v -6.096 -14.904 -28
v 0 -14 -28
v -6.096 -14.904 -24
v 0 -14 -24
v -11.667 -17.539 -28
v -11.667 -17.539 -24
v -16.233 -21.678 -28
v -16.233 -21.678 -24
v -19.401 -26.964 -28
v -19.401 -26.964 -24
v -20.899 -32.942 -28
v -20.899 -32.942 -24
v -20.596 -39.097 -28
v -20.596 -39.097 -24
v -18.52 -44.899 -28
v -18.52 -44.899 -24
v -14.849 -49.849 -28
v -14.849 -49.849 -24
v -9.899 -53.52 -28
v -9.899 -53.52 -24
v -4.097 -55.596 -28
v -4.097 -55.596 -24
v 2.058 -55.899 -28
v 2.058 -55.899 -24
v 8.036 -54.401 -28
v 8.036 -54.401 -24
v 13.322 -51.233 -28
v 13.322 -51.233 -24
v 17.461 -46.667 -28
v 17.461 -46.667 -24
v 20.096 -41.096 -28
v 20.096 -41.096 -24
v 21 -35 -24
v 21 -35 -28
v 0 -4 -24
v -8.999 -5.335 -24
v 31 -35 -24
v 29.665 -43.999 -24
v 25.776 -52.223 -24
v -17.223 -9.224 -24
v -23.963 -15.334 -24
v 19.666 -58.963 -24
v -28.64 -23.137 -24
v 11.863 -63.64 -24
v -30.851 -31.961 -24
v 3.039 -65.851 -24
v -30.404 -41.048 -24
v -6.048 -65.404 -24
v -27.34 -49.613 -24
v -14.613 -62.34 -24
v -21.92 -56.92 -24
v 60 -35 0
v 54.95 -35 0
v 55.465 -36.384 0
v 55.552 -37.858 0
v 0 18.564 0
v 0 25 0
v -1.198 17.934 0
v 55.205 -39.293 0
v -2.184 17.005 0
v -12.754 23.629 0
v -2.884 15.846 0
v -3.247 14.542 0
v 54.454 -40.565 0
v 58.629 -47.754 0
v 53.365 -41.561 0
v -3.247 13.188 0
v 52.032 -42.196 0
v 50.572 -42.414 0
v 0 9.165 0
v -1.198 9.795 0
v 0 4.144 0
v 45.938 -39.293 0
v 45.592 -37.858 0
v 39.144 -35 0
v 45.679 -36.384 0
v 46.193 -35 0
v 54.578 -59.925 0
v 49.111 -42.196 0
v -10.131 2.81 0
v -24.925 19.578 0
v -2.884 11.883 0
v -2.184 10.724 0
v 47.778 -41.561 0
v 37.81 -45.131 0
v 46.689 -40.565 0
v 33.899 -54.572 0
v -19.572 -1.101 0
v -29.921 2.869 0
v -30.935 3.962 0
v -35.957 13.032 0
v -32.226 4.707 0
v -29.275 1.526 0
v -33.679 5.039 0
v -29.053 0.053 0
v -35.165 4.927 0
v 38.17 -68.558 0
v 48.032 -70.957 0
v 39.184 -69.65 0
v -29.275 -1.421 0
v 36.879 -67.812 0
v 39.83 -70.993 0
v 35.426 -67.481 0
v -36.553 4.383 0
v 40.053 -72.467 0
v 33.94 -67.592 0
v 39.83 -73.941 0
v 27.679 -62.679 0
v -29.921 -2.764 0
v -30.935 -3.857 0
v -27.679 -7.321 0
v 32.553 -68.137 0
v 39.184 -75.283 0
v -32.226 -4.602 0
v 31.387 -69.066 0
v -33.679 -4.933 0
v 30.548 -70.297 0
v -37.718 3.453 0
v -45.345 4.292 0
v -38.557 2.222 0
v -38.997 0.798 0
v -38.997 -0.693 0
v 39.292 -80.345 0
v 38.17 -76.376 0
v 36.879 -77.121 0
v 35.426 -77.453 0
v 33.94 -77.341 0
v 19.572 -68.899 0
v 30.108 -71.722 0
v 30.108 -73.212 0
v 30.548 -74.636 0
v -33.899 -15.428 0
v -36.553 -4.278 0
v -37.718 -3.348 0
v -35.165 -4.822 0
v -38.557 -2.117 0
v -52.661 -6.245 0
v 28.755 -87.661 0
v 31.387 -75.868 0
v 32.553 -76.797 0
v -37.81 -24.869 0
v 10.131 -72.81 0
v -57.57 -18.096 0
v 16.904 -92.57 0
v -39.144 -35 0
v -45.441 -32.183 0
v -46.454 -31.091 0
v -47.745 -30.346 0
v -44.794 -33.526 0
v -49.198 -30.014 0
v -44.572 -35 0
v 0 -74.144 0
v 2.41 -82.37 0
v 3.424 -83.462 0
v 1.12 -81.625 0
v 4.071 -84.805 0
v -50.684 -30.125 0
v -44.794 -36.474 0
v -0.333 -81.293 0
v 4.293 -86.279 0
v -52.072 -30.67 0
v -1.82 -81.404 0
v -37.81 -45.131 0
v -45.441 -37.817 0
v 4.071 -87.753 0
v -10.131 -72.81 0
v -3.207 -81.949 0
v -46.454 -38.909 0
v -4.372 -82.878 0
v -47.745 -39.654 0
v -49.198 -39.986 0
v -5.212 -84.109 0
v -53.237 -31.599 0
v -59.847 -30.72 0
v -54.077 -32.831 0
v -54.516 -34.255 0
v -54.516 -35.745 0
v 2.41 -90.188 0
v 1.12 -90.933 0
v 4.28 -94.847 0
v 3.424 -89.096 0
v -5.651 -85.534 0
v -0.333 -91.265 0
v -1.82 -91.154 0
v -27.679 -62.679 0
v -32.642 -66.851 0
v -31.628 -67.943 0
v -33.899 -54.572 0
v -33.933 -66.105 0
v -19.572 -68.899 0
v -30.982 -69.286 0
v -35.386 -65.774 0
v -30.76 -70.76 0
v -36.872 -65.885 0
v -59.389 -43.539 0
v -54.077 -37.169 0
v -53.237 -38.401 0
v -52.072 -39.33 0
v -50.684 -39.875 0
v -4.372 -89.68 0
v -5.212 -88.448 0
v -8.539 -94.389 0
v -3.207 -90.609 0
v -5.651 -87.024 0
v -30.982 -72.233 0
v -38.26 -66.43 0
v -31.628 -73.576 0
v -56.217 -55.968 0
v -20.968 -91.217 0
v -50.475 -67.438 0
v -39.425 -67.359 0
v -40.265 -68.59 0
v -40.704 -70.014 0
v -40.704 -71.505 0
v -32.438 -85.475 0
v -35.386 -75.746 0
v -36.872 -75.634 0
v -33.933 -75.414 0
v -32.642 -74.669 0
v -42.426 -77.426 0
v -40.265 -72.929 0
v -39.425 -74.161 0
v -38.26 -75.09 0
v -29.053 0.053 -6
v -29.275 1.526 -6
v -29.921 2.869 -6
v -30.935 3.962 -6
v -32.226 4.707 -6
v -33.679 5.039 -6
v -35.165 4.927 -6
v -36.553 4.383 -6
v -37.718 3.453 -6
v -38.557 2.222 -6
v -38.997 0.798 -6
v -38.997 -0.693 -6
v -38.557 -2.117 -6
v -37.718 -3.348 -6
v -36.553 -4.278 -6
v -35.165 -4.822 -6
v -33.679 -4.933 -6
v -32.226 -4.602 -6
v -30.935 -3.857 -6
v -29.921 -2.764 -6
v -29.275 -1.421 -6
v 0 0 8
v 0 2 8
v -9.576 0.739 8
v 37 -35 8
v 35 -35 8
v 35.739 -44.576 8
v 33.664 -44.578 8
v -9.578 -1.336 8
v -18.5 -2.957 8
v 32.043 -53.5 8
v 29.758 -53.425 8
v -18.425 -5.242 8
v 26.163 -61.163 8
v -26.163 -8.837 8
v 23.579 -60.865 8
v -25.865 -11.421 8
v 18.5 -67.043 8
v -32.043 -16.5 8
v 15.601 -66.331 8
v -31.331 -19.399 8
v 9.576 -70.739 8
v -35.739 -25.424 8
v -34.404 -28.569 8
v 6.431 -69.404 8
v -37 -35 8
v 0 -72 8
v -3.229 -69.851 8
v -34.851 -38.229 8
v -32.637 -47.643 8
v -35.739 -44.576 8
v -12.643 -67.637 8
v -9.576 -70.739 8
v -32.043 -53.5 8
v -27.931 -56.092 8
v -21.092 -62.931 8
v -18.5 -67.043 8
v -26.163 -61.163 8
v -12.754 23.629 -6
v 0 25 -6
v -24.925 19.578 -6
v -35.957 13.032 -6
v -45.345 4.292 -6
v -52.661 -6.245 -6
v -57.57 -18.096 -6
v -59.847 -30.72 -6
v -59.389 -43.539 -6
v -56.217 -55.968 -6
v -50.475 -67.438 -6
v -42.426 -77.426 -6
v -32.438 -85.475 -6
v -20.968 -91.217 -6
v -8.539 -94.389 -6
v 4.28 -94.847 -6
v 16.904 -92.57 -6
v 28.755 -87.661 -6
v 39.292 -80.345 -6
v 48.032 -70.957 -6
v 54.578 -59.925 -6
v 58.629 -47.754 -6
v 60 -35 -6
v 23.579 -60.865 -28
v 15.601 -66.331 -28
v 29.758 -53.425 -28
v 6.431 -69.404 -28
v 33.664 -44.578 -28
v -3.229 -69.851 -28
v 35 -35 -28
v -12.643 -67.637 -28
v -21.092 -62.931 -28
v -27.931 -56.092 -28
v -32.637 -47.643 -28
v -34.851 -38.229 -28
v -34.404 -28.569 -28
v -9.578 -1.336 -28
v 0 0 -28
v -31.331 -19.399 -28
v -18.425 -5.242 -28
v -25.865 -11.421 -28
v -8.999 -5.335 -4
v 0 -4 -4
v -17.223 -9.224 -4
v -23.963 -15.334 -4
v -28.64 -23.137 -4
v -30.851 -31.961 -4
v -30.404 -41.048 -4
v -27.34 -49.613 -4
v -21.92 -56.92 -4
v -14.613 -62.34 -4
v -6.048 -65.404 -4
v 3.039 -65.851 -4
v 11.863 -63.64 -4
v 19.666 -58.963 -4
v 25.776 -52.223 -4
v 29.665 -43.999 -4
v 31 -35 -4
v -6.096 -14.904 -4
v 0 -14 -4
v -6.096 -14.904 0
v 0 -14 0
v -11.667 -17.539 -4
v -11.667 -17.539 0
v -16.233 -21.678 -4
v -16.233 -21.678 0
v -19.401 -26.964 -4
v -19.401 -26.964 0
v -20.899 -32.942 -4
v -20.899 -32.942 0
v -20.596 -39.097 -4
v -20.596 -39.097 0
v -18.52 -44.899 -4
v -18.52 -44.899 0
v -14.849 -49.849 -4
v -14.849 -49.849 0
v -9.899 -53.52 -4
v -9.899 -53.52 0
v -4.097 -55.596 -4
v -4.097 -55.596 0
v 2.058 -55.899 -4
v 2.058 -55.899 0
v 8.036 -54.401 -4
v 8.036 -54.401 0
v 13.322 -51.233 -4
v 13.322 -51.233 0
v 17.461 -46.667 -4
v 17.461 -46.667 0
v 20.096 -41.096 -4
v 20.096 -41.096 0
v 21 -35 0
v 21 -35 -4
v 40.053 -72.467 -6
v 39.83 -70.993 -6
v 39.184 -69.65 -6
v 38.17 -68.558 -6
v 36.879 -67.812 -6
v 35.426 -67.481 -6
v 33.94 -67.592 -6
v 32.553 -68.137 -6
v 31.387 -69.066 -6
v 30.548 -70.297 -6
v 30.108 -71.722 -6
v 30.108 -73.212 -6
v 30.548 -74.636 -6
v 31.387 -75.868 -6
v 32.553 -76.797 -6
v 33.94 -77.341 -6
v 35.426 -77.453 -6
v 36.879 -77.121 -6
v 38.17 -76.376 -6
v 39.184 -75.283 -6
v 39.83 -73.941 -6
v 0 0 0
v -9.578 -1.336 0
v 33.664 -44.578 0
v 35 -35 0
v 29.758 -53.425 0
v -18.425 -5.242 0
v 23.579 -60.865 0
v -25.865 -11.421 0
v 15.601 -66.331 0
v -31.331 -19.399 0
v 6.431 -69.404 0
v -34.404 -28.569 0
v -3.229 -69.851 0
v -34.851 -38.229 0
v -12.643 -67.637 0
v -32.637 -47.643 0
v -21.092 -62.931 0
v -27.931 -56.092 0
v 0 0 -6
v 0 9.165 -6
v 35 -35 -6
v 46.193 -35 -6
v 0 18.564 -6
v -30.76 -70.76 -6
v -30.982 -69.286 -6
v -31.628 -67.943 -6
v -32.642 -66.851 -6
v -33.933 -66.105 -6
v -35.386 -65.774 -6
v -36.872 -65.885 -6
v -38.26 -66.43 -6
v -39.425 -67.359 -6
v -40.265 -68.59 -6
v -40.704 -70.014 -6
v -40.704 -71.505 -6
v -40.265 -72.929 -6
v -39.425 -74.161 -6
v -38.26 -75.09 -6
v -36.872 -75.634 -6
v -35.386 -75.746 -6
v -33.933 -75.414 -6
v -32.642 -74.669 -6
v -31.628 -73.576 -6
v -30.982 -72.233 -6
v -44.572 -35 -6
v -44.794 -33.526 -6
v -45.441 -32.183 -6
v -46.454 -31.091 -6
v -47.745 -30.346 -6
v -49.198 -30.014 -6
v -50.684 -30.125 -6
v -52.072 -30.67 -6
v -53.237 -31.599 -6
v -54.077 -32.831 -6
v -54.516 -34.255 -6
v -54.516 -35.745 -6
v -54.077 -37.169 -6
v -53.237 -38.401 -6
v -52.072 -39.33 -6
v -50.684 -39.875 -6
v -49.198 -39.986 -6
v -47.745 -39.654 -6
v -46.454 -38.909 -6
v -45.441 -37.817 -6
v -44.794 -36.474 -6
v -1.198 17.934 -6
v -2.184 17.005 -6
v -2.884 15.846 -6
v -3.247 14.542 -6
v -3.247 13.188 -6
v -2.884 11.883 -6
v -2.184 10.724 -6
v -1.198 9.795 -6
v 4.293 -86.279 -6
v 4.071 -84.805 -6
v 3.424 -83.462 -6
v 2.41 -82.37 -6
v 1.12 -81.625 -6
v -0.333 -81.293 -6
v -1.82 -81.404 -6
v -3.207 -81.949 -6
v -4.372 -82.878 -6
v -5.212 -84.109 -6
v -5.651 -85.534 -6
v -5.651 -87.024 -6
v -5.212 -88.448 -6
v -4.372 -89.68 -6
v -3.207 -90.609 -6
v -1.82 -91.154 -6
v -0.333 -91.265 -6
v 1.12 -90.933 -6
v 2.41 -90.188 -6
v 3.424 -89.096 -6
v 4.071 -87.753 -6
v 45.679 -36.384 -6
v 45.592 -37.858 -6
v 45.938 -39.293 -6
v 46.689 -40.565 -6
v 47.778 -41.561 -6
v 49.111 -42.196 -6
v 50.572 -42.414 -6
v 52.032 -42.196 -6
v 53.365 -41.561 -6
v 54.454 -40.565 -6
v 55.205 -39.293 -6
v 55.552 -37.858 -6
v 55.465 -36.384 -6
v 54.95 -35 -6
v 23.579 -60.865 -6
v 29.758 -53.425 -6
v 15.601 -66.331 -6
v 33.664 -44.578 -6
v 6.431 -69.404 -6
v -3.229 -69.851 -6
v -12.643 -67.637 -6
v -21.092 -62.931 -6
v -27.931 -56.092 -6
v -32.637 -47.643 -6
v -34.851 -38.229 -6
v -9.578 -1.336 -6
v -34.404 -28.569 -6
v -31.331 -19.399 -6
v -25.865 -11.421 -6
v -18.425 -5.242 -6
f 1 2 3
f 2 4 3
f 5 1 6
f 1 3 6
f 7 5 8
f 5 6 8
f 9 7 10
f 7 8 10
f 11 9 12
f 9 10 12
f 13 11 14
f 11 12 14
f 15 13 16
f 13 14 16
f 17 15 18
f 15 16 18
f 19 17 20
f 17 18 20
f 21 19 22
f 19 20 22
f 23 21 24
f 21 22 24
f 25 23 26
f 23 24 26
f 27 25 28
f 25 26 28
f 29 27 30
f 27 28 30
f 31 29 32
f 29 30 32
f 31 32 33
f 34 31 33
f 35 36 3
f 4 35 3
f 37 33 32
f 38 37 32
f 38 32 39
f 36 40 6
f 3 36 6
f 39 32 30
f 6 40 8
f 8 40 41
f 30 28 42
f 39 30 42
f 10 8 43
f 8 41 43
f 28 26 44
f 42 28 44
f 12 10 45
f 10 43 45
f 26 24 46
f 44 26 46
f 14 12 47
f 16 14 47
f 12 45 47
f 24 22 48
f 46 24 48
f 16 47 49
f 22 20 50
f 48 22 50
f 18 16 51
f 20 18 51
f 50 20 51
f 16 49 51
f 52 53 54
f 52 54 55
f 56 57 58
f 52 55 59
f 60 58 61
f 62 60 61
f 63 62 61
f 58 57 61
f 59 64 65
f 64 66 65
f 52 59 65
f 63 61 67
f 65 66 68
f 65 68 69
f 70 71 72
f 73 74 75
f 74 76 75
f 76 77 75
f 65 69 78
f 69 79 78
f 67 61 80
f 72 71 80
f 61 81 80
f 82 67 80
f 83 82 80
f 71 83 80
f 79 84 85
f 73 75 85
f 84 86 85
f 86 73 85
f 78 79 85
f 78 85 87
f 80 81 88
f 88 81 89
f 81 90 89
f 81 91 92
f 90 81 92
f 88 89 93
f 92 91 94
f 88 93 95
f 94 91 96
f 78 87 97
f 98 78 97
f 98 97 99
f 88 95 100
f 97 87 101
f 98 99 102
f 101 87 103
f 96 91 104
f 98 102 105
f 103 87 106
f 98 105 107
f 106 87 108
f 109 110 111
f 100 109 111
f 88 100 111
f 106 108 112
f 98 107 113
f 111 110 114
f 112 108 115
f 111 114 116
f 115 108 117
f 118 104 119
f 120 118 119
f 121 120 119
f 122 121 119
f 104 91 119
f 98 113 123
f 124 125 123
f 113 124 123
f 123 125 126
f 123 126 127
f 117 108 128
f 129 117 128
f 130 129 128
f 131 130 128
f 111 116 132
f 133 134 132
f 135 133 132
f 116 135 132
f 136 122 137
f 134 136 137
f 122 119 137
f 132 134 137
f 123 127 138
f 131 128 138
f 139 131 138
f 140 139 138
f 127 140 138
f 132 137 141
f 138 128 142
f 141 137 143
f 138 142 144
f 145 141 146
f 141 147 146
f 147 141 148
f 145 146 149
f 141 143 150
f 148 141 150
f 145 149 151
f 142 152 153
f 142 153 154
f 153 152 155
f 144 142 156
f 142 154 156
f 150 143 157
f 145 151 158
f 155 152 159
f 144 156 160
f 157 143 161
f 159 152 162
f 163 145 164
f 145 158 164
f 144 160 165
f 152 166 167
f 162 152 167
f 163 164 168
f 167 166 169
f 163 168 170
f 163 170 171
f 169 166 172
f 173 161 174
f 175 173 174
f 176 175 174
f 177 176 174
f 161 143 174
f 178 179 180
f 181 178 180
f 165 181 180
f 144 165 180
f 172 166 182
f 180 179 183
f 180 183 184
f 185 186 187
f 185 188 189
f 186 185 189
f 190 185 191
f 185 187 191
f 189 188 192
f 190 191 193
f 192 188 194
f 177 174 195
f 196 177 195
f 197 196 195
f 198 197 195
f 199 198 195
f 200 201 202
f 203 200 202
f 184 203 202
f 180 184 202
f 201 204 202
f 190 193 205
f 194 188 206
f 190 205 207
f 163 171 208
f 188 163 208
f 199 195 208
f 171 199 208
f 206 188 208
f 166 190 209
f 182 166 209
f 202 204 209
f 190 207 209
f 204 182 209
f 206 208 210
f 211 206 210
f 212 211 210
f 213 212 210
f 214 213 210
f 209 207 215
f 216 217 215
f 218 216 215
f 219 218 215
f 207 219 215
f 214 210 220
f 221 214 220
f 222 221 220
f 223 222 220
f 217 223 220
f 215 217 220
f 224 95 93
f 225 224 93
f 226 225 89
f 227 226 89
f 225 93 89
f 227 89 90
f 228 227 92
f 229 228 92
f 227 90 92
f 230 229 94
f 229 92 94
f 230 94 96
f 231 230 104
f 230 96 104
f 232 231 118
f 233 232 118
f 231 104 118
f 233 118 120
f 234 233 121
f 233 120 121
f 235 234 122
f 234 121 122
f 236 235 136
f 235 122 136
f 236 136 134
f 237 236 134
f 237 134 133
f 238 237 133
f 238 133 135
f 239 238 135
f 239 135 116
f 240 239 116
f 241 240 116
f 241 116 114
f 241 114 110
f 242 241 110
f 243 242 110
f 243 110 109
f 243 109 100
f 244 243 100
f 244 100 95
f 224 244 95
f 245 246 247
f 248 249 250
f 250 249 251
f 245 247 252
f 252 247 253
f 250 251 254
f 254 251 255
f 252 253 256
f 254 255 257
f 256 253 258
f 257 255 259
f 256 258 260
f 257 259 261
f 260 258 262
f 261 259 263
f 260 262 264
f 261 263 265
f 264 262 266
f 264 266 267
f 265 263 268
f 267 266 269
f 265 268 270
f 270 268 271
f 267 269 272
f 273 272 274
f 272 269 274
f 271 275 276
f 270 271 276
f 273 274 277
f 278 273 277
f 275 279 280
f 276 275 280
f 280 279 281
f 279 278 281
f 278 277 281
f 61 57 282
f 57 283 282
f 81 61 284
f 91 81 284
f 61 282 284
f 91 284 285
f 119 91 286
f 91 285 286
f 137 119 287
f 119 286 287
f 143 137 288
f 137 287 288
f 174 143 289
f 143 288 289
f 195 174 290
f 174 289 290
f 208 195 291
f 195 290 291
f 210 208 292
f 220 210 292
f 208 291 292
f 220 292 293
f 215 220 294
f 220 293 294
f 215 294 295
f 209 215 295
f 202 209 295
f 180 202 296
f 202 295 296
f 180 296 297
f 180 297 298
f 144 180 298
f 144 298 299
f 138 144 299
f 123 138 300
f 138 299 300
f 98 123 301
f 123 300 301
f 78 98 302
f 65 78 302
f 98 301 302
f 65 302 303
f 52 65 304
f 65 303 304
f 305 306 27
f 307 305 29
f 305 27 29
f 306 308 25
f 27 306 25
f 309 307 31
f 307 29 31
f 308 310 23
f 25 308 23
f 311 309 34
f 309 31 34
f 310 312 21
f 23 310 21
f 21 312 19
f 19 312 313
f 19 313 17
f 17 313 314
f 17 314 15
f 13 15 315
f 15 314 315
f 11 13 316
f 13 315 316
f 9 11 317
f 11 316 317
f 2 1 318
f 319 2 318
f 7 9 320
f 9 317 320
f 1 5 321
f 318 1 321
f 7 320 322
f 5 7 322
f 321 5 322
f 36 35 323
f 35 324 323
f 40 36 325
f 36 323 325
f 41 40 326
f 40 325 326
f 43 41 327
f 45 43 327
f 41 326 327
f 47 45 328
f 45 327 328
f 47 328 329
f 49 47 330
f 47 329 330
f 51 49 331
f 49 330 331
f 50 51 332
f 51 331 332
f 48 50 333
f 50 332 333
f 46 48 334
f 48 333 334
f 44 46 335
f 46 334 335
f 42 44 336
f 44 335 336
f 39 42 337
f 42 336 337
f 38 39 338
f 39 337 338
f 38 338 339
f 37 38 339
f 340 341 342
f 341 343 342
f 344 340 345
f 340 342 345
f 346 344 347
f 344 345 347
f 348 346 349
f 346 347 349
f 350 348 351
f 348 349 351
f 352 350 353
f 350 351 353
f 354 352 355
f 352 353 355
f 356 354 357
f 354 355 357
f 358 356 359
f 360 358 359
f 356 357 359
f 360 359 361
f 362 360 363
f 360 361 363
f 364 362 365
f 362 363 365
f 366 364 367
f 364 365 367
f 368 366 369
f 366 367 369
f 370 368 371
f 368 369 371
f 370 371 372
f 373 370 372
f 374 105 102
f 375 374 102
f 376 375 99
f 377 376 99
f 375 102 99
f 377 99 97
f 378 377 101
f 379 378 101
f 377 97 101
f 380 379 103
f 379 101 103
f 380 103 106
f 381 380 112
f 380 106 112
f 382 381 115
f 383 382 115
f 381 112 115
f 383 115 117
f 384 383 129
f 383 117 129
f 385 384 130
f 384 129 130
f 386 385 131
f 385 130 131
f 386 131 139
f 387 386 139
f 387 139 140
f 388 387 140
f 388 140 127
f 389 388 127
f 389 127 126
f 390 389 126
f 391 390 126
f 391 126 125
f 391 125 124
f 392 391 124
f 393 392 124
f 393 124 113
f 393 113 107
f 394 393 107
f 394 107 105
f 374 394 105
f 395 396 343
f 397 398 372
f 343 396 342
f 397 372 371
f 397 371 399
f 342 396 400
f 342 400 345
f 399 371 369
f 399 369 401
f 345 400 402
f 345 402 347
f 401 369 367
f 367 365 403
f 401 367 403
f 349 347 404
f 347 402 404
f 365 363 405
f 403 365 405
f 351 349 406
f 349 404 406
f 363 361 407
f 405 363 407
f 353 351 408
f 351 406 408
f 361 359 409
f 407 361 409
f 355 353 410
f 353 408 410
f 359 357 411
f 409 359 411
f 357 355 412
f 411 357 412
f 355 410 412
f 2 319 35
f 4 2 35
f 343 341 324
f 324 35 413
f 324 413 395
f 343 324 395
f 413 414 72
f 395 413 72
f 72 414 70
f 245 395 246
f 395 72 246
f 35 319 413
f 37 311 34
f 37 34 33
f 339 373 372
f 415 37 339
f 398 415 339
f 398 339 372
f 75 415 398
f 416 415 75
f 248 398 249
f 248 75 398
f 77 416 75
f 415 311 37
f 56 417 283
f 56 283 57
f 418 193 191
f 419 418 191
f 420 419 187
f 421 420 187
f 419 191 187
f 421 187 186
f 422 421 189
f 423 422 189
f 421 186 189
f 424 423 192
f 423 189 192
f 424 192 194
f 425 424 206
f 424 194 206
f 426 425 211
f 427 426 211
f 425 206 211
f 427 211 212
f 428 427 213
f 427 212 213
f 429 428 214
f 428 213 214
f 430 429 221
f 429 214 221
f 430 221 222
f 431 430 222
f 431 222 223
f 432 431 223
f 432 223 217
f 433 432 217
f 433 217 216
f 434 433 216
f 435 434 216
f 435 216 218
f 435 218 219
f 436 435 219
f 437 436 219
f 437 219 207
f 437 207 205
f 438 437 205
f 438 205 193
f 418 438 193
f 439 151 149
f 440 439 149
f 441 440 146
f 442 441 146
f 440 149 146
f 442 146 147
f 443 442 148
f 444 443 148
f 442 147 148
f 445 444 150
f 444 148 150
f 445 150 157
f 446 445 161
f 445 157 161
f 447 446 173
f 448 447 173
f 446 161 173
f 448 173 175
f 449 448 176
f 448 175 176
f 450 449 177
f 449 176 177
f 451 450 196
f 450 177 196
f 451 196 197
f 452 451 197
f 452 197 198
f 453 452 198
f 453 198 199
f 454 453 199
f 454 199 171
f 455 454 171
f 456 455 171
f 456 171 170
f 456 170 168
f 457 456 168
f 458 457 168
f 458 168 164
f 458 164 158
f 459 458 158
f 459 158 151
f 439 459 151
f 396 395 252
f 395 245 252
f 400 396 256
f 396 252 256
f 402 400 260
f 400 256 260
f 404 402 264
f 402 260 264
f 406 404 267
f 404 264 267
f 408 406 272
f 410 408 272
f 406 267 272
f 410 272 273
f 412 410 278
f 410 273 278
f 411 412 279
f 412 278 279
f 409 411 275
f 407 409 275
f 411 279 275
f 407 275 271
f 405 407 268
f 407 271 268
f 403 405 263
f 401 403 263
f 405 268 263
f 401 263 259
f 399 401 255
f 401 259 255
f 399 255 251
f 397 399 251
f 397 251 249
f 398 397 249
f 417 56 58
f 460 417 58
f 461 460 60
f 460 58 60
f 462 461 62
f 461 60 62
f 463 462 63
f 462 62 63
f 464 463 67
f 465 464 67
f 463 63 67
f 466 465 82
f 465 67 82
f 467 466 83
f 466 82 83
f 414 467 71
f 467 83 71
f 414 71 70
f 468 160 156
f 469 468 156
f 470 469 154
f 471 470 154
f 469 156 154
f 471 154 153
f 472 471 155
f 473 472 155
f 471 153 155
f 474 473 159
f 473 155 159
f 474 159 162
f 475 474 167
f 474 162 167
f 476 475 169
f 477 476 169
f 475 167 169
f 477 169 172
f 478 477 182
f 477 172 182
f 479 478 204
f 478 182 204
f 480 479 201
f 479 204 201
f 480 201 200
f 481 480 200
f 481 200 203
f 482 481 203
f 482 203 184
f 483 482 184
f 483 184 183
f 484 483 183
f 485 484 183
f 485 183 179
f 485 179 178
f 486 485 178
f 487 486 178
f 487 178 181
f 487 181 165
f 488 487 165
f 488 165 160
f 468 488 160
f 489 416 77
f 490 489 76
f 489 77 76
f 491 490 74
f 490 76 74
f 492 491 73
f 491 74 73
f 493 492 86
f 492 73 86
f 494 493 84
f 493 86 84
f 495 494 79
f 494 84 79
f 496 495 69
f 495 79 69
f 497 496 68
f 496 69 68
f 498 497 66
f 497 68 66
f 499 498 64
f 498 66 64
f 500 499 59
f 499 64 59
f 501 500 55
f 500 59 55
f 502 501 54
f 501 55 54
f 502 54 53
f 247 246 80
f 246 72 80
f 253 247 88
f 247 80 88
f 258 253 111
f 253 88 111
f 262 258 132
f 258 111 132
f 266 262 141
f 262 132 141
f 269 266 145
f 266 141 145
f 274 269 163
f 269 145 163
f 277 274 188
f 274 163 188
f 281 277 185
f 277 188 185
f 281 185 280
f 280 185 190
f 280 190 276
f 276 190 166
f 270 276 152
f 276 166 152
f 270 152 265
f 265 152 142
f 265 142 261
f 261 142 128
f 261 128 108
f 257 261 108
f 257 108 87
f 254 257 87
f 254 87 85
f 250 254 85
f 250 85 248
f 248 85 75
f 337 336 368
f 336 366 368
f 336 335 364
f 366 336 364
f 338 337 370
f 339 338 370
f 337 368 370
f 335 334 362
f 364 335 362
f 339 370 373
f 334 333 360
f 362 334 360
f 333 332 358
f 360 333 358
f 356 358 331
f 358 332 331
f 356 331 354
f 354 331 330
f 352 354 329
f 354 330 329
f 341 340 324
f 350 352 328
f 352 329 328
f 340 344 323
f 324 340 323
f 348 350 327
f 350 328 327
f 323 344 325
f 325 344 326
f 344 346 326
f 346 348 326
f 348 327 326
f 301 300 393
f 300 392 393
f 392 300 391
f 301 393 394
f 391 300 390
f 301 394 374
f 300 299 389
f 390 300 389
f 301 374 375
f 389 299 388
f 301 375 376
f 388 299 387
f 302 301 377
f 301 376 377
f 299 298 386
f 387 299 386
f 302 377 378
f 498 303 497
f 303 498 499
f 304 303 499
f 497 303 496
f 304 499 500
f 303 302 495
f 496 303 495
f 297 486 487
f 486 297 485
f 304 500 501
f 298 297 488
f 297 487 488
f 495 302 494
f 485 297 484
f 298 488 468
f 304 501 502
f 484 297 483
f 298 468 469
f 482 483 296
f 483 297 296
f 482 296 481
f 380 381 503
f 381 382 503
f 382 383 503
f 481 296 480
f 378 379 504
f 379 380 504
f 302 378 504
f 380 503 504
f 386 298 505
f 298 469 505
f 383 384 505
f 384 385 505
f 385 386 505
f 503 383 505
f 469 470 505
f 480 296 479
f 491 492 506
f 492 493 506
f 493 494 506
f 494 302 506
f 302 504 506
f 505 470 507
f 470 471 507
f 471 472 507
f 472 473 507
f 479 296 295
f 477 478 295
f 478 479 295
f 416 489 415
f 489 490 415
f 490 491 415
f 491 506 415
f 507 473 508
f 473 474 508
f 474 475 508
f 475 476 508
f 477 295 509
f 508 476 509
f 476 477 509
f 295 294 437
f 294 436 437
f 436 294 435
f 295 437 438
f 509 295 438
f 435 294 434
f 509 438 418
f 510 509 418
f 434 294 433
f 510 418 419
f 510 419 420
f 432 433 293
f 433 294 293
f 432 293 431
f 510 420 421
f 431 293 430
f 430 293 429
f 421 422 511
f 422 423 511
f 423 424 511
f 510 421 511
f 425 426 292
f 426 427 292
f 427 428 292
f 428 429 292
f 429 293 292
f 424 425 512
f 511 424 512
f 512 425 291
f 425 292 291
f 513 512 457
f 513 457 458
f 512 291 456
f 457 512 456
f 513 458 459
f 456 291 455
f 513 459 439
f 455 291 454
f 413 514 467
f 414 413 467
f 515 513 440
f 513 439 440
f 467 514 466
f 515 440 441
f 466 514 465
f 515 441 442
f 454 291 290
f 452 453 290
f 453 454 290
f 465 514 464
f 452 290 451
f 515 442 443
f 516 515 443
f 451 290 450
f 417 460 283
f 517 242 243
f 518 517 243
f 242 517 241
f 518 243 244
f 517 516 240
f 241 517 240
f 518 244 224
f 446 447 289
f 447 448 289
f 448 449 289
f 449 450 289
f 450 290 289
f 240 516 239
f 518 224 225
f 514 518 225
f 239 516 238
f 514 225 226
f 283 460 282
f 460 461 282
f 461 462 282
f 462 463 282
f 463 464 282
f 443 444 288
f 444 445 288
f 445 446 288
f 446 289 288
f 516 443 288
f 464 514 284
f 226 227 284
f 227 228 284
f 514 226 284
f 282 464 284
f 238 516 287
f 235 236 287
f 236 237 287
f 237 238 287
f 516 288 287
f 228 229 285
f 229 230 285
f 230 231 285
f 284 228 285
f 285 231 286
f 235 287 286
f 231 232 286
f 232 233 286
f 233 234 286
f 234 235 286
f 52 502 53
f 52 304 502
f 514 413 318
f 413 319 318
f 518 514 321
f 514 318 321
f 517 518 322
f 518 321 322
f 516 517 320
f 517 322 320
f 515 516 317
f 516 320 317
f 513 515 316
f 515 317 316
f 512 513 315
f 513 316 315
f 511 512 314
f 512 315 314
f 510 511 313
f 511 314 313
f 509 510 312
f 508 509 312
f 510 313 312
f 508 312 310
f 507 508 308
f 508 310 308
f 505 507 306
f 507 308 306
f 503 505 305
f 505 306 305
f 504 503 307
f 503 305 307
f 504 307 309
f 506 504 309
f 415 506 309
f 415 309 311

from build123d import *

# Parameters (mm, degrees)
REVOLVE1_ANGLE     = 270
SKETCH3_R          = 5
CUT_EXTRUDE1_DEPTH = 8


with BuildPart() as part:
    # Sketch2 → Revolve1 (revolve)
    with BuildSketch(Plane(origin=(0, 0, 0), x_dir=(0, 0, -1), z_dir=(1, 0, 0))):
        Polygon((0, 0), (-8, 0), (-8, 2), (0, 4.143593539), (0, 25), (6, 25), (6, 0), (28, 0), (28, -14), (24, -14), (24, -4), (4, -4), (4, -14), (0, -14), align=None)
    revolve(axis=Axis((0, -35, 8), (0, 0, 1)), revolution_arc=REVOLVE1_ANGLE)

    # Sketch3 → Cut-Extrude1 (cut)
    with BuildSketch(Plane.XY):
        with Locations((-49.57179677, -35)):
            Circle(SKETCH3_R)
        with Locations((-35.759660433, -70.759660433)):
            Circle(SKETCH3_R)
        with Locations((-0.707106781, -86.278903551)):
            Circle(SKETCH3_R)
        with Locations((35.052553651, -72.466767214)):
            Circle(SKETCH3_R)
        with Locations((50.57179677, -37.414213562)):
            Circle(SKETCH3_R)
        with Locations((36.759660433, -1.65455313)):
            Circle(SKETCH3_R)
        with Locations((1.707106781, 13.864689989)):
            Circle(SKETCH3_R)
        with Locations((-34.052553651, 0.052553651)):
            Circle(SKETCH3_R)
    extrude(amount=-CUT_EXTRUDE1_DEPTH, mode=Mode.SUBTRACT)


solid = part.part
